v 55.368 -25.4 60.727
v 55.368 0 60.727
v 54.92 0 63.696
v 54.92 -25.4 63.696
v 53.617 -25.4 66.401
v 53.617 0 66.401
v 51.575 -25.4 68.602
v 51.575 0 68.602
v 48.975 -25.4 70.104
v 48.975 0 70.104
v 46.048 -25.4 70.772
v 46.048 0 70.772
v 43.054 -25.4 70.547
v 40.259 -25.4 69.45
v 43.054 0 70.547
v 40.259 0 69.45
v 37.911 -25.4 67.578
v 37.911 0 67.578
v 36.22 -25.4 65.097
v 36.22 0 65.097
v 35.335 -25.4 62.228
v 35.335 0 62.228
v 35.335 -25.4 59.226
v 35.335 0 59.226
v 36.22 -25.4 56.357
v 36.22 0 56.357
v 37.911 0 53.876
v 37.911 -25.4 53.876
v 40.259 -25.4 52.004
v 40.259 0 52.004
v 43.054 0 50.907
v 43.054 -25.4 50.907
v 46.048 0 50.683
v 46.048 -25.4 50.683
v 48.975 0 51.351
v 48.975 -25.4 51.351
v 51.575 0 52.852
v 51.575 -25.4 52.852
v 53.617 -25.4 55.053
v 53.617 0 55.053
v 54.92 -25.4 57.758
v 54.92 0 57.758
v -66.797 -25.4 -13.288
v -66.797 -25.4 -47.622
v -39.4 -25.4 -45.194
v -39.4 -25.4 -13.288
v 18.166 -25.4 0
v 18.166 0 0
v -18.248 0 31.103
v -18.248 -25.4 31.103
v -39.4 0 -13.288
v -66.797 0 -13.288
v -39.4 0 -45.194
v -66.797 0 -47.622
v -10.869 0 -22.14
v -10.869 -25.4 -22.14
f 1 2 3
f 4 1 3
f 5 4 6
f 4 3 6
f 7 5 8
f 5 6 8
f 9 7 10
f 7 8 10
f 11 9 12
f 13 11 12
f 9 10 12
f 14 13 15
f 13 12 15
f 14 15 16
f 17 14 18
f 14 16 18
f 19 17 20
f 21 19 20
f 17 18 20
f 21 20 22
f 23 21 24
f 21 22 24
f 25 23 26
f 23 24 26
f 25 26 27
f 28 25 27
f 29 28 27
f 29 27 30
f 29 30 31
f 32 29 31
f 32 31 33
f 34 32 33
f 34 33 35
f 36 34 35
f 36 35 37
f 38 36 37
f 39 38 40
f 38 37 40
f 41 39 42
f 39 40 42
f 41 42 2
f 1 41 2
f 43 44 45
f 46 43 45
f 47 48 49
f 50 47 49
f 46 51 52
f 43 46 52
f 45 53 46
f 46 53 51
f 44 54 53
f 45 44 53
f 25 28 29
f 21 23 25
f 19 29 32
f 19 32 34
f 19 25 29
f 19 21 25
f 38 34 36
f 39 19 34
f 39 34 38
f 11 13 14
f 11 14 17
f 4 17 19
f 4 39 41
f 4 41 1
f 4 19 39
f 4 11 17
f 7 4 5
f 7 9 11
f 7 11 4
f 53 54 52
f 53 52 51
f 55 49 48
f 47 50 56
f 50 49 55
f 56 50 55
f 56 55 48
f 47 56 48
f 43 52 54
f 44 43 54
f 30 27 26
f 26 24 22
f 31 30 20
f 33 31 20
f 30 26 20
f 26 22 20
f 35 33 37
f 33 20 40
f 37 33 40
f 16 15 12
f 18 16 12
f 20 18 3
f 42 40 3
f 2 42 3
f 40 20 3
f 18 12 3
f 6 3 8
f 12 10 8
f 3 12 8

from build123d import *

# Parameters (mm, degrees)
F0_R     = 10.072743
F1_DEPTH = 25.4


with BuildPart() as f1:
    # F0 (on Front) → F1 (new body)
    with BuildSketch(Plane.XZ):
        with Locations((45.295006, 60.727093)):
            Circle(F0_R)
        Polygon((-39.399829, -13.288022), (-66.797405, -13.288022), (-66.797405, -47.62169), (-39.399829, -45.19406), align=None)
        Polygon((18.16641, 0), (-18.248085, 31.102986), (-10.868783, -22.139814), align=None)
    extrude(amount=F1_DEPTH)


solid = f1.part
